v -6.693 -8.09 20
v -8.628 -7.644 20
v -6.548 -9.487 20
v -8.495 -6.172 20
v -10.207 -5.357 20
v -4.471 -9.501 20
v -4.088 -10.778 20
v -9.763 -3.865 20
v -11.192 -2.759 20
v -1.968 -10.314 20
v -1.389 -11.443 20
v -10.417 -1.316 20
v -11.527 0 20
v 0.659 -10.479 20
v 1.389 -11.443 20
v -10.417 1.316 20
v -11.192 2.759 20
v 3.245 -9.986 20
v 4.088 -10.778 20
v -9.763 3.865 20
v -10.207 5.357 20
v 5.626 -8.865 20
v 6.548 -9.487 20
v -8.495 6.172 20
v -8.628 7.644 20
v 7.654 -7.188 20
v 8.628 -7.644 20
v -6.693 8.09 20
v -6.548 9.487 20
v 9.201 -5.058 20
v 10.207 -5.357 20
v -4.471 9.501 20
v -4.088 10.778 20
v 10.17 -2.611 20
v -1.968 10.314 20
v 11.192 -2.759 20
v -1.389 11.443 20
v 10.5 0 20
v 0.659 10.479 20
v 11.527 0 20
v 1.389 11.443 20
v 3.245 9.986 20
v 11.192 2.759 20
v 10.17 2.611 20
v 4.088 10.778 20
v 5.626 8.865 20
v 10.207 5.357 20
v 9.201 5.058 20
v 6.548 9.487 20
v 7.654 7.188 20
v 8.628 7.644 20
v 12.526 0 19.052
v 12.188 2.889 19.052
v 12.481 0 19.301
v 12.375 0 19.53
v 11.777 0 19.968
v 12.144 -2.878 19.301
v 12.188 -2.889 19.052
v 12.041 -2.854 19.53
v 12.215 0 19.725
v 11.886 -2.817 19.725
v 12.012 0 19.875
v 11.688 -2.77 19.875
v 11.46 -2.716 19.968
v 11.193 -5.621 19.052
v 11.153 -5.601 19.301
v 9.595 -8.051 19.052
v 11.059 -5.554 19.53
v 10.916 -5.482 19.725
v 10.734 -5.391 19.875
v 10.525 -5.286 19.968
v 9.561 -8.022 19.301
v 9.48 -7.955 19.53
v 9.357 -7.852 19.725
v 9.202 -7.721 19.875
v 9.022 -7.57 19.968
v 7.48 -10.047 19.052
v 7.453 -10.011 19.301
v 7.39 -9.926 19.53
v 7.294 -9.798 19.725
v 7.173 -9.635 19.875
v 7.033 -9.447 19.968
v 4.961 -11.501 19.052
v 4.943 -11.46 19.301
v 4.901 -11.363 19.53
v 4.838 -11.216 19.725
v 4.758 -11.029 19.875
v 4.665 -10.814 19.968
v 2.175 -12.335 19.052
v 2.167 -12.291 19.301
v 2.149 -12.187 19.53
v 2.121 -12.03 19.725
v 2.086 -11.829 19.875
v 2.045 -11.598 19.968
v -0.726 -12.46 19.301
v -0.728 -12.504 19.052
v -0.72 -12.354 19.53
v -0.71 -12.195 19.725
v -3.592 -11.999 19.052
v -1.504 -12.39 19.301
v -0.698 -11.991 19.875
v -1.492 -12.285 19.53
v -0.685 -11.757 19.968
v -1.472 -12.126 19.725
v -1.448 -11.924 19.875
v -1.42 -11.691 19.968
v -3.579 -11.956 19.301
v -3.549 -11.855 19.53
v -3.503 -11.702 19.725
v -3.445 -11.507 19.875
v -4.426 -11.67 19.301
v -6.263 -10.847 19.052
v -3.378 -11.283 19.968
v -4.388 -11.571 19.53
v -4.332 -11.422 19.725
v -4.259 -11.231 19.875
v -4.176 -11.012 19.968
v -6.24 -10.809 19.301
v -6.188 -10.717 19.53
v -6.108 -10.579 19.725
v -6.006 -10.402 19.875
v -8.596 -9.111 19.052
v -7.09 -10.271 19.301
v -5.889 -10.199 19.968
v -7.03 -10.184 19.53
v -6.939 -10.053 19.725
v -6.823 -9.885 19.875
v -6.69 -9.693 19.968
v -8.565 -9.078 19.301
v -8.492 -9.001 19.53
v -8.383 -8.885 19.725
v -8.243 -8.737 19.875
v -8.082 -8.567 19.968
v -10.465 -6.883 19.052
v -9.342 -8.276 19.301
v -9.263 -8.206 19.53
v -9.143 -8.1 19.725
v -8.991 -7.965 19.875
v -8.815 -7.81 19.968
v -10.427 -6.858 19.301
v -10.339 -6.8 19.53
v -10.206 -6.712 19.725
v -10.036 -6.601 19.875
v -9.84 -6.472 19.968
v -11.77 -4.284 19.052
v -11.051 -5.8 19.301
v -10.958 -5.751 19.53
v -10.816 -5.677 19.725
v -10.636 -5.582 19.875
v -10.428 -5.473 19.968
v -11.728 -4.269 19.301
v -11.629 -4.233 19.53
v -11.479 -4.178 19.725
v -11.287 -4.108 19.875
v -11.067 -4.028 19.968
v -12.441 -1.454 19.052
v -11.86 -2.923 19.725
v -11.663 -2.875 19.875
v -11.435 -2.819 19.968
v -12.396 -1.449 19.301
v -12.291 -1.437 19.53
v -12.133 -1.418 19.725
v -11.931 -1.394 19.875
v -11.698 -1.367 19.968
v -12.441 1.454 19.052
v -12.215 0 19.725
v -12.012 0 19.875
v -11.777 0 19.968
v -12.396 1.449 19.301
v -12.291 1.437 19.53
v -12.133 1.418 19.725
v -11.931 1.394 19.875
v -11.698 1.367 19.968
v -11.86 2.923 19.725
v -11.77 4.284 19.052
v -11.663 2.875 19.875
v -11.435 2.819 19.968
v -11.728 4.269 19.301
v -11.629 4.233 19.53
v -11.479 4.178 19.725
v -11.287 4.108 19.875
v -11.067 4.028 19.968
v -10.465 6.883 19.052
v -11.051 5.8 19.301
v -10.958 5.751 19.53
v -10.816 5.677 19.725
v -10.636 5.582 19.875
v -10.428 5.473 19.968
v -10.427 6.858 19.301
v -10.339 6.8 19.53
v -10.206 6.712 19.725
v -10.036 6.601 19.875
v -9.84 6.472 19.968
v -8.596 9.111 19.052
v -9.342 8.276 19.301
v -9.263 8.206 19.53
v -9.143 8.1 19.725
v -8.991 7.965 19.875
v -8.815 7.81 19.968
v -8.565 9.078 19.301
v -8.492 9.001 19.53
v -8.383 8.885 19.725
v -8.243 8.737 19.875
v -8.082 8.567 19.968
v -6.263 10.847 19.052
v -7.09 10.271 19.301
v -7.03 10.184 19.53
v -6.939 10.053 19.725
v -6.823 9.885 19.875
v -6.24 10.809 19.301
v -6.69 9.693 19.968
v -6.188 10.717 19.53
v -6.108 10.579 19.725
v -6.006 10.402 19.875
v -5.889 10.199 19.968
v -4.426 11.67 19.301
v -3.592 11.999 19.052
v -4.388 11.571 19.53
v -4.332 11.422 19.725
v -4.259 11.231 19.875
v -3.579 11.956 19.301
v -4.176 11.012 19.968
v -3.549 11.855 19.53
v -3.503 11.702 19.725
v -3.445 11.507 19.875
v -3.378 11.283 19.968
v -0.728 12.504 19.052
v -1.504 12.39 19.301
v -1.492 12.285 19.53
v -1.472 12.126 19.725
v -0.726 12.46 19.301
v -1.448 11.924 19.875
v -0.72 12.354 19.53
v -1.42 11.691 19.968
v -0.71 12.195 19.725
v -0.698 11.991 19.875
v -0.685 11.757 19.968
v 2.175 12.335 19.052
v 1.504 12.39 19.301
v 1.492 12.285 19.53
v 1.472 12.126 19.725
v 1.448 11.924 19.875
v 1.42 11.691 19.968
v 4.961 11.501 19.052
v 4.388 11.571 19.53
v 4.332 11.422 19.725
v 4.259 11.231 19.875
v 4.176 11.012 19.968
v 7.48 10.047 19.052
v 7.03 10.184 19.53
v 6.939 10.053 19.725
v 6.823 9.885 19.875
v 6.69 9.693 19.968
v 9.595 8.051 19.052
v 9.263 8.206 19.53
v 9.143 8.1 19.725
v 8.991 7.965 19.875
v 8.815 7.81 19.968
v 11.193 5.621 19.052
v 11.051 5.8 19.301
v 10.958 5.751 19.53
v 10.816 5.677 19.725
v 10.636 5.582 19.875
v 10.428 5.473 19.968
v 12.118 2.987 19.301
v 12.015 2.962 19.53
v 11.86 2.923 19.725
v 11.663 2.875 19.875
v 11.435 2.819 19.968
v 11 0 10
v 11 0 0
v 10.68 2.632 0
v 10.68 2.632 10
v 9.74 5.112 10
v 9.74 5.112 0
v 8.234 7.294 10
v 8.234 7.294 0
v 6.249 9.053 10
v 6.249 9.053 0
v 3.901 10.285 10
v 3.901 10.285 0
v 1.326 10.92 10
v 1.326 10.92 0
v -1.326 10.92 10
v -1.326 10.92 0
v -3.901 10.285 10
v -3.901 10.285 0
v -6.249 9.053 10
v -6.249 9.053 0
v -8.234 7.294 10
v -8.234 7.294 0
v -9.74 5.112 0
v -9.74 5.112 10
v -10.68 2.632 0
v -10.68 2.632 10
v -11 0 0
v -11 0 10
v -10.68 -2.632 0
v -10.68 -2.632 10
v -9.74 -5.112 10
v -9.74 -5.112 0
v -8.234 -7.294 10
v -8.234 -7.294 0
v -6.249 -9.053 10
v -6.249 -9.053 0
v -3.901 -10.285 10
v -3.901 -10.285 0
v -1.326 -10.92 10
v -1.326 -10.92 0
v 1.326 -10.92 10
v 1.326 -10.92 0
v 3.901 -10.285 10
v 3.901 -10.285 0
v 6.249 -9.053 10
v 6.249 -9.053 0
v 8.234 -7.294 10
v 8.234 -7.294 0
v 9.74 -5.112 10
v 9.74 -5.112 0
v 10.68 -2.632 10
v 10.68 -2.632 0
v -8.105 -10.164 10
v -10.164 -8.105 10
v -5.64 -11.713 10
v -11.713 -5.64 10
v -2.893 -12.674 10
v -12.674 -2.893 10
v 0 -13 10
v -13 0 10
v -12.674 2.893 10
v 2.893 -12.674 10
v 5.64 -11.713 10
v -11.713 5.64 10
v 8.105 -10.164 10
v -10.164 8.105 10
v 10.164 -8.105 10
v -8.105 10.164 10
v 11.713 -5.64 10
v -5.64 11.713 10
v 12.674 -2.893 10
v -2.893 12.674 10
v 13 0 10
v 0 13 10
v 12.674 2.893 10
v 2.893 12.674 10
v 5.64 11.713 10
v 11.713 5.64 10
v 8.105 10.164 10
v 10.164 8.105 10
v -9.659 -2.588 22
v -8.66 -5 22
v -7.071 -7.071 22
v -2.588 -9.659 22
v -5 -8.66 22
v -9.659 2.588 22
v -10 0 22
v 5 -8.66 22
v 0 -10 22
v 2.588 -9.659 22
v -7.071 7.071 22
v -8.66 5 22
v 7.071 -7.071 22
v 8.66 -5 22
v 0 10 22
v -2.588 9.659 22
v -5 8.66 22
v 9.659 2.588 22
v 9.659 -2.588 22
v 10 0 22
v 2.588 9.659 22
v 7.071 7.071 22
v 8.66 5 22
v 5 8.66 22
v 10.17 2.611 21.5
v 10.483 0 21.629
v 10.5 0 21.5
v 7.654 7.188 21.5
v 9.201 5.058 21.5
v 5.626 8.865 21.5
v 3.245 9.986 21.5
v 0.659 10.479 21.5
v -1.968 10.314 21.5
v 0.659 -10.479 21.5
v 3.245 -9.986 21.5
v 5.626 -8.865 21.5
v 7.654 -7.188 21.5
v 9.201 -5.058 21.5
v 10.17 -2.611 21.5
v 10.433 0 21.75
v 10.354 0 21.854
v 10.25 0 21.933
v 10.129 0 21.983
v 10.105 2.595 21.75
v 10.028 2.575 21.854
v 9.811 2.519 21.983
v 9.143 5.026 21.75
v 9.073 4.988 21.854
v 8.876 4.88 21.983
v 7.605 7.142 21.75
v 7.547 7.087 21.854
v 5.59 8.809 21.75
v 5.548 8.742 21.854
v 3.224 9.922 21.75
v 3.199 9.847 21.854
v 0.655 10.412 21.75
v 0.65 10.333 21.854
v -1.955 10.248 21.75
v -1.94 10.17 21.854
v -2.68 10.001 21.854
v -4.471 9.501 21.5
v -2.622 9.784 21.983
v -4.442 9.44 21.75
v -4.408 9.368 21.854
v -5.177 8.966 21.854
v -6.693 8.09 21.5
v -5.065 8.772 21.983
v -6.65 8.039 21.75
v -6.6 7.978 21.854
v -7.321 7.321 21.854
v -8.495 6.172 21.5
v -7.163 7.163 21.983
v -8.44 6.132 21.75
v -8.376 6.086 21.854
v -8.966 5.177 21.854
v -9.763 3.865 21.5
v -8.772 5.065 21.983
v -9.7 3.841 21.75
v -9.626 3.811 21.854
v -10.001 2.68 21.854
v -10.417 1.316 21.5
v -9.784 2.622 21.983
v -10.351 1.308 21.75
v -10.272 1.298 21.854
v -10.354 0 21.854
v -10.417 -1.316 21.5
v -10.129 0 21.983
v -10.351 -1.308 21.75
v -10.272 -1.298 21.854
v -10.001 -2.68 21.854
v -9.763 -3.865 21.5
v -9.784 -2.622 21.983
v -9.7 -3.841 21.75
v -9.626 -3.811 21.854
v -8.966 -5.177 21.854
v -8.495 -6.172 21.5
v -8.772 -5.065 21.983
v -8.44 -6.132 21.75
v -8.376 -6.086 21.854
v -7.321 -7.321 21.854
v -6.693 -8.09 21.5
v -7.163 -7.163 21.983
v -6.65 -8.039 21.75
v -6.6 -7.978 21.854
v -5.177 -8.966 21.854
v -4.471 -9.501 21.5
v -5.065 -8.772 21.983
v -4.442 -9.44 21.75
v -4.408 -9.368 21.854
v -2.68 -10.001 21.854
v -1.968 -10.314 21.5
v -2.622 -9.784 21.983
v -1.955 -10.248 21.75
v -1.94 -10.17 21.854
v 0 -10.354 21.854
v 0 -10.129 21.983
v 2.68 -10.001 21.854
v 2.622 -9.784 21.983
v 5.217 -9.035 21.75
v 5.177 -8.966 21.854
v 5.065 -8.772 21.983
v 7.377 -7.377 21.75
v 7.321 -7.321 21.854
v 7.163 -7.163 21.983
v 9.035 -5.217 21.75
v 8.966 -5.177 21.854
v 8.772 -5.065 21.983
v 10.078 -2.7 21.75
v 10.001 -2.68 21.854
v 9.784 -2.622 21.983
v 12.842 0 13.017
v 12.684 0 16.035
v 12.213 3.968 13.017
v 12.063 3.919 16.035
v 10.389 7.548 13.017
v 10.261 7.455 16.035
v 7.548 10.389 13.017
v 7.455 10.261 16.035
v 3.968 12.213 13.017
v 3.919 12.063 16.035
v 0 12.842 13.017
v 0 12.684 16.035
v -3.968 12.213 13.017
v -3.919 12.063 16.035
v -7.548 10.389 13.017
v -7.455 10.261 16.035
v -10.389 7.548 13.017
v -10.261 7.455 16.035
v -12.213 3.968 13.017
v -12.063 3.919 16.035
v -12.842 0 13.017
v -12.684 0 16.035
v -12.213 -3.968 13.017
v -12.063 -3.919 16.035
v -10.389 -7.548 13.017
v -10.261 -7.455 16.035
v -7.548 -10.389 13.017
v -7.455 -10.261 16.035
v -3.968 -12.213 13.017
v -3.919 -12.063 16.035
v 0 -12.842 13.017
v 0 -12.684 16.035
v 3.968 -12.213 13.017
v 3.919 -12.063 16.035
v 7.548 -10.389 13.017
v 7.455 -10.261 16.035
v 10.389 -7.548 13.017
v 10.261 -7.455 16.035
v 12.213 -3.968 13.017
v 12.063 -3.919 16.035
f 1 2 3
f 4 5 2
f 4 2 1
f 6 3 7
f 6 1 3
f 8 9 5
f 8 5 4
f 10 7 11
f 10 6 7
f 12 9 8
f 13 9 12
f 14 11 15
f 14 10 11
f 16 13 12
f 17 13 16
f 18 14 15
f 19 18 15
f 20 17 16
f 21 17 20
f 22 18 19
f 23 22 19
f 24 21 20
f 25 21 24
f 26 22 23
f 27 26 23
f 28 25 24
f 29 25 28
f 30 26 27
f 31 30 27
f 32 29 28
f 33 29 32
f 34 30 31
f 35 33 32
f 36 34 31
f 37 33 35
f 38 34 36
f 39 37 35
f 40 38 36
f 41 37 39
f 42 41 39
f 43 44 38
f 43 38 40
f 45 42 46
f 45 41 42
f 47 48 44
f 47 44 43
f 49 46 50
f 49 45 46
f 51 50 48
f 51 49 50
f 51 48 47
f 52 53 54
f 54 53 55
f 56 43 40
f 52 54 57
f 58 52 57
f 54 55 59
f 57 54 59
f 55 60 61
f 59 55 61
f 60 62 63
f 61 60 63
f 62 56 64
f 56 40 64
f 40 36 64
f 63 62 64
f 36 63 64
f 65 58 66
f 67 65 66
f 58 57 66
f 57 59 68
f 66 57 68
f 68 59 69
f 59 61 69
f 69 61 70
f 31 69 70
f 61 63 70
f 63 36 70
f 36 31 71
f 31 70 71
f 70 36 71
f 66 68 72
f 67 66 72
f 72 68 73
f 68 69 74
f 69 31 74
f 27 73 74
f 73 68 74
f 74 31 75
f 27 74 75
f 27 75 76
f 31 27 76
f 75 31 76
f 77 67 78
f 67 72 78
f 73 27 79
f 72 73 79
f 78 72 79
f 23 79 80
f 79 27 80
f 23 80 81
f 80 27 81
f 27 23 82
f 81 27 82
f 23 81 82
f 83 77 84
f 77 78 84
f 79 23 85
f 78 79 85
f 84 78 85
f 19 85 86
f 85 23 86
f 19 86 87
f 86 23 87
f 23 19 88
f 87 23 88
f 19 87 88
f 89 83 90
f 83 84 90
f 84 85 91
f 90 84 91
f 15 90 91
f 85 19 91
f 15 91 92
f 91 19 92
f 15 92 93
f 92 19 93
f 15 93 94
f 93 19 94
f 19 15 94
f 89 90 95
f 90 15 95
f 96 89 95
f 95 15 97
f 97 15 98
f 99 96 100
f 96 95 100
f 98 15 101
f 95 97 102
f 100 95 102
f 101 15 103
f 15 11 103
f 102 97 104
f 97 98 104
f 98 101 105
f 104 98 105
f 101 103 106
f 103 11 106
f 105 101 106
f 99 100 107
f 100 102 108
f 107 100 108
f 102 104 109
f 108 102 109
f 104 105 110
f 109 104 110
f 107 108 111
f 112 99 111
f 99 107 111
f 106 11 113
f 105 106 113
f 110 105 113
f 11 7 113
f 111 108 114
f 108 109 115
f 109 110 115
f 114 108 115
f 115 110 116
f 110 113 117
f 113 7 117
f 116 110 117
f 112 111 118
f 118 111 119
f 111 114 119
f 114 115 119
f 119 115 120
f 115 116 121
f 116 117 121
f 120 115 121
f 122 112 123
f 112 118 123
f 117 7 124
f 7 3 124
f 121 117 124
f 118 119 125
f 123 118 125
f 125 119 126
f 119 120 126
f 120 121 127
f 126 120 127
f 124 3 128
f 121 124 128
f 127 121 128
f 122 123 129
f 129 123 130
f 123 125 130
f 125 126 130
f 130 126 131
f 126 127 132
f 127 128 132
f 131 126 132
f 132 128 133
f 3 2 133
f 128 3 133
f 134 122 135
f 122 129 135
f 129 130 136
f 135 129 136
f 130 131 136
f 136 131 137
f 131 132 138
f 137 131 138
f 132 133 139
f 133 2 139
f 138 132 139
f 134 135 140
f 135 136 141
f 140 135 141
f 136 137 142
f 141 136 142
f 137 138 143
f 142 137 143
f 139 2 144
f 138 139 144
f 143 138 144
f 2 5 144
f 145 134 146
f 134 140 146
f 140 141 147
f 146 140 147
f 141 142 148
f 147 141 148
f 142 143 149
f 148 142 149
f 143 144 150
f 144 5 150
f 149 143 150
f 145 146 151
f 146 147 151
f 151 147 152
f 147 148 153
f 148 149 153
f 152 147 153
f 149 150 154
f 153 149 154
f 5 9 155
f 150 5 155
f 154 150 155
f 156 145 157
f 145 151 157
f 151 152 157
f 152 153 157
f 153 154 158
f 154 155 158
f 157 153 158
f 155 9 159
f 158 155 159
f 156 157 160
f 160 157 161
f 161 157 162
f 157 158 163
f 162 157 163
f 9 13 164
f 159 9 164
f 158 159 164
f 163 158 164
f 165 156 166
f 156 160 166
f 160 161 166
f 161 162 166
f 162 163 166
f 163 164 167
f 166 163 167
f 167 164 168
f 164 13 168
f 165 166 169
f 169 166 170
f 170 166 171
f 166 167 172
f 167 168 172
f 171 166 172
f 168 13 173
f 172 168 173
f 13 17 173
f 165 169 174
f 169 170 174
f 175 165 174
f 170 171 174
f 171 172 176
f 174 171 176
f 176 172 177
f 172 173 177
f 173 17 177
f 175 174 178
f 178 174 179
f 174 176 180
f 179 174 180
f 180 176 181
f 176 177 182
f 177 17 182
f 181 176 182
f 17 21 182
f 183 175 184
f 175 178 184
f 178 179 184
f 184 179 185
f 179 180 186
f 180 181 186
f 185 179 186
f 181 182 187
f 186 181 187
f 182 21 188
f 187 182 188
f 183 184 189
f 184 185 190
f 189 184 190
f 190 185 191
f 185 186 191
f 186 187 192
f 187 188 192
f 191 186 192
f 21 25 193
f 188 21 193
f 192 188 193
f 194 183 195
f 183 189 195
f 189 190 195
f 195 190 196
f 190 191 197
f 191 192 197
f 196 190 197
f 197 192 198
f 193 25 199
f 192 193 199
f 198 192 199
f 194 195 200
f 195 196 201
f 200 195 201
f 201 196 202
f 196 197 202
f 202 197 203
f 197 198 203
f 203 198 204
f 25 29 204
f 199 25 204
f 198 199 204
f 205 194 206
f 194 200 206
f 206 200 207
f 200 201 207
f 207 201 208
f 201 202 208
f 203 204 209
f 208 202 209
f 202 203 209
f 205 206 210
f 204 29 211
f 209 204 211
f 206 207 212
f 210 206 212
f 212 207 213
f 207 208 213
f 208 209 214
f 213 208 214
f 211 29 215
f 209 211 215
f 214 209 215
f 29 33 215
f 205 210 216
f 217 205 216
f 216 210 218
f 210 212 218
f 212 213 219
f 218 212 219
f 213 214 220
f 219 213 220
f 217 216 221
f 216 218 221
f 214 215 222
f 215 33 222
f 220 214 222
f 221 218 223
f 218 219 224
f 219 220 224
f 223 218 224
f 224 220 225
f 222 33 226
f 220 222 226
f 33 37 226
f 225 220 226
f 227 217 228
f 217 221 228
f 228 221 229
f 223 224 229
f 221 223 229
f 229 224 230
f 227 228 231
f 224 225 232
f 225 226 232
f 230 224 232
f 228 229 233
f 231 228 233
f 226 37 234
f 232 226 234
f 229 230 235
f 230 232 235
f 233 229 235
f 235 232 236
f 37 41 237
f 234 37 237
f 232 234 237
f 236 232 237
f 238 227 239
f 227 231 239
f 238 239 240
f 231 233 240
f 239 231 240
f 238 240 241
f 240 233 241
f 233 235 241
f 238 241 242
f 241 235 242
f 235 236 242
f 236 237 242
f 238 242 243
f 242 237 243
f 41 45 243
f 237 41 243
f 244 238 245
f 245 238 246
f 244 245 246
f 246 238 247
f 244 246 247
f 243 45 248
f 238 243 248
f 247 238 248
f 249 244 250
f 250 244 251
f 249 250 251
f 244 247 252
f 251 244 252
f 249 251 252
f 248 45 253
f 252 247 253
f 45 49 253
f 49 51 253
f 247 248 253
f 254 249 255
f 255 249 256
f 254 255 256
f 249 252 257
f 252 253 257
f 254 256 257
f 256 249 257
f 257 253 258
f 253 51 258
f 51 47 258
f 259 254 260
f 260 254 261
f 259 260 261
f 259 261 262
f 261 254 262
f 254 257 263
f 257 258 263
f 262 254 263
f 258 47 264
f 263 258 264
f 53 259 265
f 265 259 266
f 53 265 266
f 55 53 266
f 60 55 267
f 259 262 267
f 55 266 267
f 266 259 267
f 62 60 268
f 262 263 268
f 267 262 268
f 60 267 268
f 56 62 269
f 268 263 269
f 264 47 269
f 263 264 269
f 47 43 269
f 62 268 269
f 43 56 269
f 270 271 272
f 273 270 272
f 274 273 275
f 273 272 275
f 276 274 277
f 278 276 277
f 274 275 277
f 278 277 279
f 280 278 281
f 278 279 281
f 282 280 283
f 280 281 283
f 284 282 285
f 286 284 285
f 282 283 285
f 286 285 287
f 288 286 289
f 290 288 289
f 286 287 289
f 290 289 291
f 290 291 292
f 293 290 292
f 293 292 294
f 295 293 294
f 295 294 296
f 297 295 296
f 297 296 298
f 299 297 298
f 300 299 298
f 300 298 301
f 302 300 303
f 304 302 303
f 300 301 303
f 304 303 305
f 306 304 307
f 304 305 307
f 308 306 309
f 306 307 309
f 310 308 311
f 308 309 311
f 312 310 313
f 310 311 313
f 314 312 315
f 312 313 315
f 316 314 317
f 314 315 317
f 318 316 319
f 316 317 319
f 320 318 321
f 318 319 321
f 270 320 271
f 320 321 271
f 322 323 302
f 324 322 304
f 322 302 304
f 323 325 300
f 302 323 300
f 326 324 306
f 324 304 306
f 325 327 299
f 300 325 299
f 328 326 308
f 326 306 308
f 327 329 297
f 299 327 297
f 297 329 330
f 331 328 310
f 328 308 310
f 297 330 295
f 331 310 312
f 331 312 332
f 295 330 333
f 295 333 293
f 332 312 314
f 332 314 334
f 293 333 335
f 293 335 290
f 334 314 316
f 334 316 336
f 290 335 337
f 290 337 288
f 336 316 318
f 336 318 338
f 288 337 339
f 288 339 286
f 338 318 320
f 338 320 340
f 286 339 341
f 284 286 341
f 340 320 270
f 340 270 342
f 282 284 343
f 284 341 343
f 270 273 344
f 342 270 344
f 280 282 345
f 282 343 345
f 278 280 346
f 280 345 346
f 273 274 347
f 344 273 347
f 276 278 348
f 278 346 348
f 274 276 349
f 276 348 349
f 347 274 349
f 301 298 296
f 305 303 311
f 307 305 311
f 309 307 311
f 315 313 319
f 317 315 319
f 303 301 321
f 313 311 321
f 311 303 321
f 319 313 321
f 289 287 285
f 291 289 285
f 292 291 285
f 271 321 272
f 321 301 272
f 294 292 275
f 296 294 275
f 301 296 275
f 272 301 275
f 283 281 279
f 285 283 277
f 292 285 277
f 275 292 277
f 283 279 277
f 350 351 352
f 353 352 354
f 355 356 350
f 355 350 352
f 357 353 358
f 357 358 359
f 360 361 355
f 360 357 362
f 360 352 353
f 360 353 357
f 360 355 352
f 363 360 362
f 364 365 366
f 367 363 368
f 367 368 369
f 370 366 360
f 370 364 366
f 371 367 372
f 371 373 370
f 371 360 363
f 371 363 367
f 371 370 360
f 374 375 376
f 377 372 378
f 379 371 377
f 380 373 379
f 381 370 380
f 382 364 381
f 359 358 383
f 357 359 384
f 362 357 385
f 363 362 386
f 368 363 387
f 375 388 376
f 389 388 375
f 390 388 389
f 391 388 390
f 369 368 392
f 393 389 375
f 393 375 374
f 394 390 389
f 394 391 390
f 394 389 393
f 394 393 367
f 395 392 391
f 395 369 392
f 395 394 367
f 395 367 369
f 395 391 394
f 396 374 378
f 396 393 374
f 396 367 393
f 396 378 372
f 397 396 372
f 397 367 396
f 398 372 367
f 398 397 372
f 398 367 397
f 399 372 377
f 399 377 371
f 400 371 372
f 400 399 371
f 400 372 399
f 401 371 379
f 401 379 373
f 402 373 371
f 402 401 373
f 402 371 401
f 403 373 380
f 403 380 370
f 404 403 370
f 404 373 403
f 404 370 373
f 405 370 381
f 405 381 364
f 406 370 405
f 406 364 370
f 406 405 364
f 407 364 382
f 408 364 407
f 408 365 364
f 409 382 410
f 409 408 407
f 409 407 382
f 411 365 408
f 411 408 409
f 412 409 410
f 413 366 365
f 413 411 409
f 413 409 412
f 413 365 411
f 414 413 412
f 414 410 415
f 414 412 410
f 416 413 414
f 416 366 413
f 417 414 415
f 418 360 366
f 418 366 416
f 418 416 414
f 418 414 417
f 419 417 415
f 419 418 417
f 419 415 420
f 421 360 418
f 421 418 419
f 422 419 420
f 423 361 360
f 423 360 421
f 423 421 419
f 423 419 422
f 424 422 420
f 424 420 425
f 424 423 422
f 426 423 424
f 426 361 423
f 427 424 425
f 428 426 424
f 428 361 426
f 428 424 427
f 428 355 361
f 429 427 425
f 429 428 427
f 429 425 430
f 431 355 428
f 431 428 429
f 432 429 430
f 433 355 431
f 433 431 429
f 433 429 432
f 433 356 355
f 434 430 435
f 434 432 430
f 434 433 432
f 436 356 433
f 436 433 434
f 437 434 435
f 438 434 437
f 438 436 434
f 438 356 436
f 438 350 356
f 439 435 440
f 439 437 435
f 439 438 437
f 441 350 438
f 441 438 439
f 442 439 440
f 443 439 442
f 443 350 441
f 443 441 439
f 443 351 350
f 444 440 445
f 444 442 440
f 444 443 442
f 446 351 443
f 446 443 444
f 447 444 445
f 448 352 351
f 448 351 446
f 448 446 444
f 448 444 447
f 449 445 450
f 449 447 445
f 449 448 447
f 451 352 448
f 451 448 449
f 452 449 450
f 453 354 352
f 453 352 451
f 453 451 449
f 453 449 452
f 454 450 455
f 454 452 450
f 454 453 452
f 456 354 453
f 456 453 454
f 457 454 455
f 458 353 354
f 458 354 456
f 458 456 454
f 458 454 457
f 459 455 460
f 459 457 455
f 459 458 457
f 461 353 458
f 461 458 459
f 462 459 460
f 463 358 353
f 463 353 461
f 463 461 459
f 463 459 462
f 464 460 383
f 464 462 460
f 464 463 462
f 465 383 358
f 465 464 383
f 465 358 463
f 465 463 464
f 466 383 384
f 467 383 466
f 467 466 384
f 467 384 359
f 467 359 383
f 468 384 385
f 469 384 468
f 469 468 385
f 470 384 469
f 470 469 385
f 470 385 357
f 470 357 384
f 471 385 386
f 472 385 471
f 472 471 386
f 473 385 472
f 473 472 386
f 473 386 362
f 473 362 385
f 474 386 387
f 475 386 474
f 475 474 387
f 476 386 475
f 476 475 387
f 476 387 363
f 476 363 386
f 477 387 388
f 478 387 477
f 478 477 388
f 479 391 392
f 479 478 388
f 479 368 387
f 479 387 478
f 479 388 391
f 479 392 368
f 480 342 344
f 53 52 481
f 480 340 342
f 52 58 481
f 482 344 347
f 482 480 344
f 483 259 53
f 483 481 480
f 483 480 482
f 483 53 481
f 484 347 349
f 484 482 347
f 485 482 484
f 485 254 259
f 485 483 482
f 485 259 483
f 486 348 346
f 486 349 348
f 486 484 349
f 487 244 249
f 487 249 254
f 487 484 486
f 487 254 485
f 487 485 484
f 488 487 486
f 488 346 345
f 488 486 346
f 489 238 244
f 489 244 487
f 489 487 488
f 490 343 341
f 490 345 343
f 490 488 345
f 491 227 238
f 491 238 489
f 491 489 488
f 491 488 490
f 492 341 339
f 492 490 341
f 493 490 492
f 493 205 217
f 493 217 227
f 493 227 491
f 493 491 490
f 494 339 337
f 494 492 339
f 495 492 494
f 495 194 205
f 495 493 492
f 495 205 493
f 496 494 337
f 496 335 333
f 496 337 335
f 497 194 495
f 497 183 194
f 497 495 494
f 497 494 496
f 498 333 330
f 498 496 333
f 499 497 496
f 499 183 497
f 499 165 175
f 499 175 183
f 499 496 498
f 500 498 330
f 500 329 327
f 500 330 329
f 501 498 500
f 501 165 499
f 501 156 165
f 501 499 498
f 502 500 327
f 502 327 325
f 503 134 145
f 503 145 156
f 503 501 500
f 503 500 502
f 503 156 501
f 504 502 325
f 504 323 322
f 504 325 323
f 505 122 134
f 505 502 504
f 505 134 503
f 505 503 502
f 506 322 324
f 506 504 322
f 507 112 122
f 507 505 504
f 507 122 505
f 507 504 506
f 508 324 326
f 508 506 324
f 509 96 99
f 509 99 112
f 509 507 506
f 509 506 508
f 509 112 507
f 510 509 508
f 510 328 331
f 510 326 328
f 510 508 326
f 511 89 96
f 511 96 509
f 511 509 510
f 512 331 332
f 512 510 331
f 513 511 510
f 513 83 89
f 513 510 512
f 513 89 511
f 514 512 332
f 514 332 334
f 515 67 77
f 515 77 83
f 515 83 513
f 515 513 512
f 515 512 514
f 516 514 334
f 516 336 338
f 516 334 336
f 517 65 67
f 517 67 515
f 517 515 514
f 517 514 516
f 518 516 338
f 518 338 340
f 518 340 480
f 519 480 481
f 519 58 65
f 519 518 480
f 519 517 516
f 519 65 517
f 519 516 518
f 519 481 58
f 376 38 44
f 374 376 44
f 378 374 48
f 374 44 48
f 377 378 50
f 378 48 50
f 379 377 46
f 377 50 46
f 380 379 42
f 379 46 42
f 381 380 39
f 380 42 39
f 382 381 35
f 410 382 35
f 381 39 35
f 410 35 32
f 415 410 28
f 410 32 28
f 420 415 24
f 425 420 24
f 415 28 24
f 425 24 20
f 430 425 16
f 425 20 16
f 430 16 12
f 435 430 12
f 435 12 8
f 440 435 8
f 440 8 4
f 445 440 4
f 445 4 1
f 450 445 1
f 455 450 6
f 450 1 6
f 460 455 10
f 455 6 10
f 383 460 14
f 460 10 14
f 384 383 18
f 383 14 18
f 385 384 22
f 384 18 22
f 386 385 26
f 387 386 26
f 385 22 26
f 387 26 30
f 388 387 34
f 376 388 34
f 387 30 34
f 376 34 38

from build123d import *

# Parameters (mm, degrees)
SKETCH_1_R      = 11
EXTRUDE_1_DEPTH = 10
SKETCH_2_R      = 13
EXTRUDE_2_DEPTH = 10
EXTRUDE_2_TAPER = 3
FILLET_1_R      = 1
SKETCH_3_R      = 10.5
EXTRUDE_3_DEPTH = 2
FILLET_2_R      = 0.5


with BuildPart() as part:
    # 草图1 → 凸台-拉伸1 (new body)
    with BuildSketch(Plane.XY):
        Circle(SKETCH_1_R)
    extrude(amount=EXTRUDE_1_DEPTH)

    # 草图2 → 凸台-拉伸2 (add)
    with BuildSketch(Plane.XY.offset(10)):
        Circle(SKETCH_2_R)
    extrude(amount=EXTRUDE_2_DEPTH, taper=EXTRUDE_2_TAPER)

    # 圆角1
    fillet_1_edges = [part.edges().sort_by_distance(p)[0] for p in [
        (-12.475922207, 0, 20),
    ]]
    fillet(fillet_1_edges, radius=FILLET_1_R)

    # 草图3 → 凸台-拉伸3 (add)
    with BuildSketch(Plane.XY.offset(20)):
        Circle(SKETCH_3_R)
    extrude(amount=EXTRUDE_3_DEPTH)

    # 圆角2
    fillet_2_edges = [part.edges().sort_by_distance(p)[0] for p in [
        (-10.5, 0, 22),
    ]]
    fillet(fillet_2_edges, radius=FILLET_2_R)


solid = part.part
